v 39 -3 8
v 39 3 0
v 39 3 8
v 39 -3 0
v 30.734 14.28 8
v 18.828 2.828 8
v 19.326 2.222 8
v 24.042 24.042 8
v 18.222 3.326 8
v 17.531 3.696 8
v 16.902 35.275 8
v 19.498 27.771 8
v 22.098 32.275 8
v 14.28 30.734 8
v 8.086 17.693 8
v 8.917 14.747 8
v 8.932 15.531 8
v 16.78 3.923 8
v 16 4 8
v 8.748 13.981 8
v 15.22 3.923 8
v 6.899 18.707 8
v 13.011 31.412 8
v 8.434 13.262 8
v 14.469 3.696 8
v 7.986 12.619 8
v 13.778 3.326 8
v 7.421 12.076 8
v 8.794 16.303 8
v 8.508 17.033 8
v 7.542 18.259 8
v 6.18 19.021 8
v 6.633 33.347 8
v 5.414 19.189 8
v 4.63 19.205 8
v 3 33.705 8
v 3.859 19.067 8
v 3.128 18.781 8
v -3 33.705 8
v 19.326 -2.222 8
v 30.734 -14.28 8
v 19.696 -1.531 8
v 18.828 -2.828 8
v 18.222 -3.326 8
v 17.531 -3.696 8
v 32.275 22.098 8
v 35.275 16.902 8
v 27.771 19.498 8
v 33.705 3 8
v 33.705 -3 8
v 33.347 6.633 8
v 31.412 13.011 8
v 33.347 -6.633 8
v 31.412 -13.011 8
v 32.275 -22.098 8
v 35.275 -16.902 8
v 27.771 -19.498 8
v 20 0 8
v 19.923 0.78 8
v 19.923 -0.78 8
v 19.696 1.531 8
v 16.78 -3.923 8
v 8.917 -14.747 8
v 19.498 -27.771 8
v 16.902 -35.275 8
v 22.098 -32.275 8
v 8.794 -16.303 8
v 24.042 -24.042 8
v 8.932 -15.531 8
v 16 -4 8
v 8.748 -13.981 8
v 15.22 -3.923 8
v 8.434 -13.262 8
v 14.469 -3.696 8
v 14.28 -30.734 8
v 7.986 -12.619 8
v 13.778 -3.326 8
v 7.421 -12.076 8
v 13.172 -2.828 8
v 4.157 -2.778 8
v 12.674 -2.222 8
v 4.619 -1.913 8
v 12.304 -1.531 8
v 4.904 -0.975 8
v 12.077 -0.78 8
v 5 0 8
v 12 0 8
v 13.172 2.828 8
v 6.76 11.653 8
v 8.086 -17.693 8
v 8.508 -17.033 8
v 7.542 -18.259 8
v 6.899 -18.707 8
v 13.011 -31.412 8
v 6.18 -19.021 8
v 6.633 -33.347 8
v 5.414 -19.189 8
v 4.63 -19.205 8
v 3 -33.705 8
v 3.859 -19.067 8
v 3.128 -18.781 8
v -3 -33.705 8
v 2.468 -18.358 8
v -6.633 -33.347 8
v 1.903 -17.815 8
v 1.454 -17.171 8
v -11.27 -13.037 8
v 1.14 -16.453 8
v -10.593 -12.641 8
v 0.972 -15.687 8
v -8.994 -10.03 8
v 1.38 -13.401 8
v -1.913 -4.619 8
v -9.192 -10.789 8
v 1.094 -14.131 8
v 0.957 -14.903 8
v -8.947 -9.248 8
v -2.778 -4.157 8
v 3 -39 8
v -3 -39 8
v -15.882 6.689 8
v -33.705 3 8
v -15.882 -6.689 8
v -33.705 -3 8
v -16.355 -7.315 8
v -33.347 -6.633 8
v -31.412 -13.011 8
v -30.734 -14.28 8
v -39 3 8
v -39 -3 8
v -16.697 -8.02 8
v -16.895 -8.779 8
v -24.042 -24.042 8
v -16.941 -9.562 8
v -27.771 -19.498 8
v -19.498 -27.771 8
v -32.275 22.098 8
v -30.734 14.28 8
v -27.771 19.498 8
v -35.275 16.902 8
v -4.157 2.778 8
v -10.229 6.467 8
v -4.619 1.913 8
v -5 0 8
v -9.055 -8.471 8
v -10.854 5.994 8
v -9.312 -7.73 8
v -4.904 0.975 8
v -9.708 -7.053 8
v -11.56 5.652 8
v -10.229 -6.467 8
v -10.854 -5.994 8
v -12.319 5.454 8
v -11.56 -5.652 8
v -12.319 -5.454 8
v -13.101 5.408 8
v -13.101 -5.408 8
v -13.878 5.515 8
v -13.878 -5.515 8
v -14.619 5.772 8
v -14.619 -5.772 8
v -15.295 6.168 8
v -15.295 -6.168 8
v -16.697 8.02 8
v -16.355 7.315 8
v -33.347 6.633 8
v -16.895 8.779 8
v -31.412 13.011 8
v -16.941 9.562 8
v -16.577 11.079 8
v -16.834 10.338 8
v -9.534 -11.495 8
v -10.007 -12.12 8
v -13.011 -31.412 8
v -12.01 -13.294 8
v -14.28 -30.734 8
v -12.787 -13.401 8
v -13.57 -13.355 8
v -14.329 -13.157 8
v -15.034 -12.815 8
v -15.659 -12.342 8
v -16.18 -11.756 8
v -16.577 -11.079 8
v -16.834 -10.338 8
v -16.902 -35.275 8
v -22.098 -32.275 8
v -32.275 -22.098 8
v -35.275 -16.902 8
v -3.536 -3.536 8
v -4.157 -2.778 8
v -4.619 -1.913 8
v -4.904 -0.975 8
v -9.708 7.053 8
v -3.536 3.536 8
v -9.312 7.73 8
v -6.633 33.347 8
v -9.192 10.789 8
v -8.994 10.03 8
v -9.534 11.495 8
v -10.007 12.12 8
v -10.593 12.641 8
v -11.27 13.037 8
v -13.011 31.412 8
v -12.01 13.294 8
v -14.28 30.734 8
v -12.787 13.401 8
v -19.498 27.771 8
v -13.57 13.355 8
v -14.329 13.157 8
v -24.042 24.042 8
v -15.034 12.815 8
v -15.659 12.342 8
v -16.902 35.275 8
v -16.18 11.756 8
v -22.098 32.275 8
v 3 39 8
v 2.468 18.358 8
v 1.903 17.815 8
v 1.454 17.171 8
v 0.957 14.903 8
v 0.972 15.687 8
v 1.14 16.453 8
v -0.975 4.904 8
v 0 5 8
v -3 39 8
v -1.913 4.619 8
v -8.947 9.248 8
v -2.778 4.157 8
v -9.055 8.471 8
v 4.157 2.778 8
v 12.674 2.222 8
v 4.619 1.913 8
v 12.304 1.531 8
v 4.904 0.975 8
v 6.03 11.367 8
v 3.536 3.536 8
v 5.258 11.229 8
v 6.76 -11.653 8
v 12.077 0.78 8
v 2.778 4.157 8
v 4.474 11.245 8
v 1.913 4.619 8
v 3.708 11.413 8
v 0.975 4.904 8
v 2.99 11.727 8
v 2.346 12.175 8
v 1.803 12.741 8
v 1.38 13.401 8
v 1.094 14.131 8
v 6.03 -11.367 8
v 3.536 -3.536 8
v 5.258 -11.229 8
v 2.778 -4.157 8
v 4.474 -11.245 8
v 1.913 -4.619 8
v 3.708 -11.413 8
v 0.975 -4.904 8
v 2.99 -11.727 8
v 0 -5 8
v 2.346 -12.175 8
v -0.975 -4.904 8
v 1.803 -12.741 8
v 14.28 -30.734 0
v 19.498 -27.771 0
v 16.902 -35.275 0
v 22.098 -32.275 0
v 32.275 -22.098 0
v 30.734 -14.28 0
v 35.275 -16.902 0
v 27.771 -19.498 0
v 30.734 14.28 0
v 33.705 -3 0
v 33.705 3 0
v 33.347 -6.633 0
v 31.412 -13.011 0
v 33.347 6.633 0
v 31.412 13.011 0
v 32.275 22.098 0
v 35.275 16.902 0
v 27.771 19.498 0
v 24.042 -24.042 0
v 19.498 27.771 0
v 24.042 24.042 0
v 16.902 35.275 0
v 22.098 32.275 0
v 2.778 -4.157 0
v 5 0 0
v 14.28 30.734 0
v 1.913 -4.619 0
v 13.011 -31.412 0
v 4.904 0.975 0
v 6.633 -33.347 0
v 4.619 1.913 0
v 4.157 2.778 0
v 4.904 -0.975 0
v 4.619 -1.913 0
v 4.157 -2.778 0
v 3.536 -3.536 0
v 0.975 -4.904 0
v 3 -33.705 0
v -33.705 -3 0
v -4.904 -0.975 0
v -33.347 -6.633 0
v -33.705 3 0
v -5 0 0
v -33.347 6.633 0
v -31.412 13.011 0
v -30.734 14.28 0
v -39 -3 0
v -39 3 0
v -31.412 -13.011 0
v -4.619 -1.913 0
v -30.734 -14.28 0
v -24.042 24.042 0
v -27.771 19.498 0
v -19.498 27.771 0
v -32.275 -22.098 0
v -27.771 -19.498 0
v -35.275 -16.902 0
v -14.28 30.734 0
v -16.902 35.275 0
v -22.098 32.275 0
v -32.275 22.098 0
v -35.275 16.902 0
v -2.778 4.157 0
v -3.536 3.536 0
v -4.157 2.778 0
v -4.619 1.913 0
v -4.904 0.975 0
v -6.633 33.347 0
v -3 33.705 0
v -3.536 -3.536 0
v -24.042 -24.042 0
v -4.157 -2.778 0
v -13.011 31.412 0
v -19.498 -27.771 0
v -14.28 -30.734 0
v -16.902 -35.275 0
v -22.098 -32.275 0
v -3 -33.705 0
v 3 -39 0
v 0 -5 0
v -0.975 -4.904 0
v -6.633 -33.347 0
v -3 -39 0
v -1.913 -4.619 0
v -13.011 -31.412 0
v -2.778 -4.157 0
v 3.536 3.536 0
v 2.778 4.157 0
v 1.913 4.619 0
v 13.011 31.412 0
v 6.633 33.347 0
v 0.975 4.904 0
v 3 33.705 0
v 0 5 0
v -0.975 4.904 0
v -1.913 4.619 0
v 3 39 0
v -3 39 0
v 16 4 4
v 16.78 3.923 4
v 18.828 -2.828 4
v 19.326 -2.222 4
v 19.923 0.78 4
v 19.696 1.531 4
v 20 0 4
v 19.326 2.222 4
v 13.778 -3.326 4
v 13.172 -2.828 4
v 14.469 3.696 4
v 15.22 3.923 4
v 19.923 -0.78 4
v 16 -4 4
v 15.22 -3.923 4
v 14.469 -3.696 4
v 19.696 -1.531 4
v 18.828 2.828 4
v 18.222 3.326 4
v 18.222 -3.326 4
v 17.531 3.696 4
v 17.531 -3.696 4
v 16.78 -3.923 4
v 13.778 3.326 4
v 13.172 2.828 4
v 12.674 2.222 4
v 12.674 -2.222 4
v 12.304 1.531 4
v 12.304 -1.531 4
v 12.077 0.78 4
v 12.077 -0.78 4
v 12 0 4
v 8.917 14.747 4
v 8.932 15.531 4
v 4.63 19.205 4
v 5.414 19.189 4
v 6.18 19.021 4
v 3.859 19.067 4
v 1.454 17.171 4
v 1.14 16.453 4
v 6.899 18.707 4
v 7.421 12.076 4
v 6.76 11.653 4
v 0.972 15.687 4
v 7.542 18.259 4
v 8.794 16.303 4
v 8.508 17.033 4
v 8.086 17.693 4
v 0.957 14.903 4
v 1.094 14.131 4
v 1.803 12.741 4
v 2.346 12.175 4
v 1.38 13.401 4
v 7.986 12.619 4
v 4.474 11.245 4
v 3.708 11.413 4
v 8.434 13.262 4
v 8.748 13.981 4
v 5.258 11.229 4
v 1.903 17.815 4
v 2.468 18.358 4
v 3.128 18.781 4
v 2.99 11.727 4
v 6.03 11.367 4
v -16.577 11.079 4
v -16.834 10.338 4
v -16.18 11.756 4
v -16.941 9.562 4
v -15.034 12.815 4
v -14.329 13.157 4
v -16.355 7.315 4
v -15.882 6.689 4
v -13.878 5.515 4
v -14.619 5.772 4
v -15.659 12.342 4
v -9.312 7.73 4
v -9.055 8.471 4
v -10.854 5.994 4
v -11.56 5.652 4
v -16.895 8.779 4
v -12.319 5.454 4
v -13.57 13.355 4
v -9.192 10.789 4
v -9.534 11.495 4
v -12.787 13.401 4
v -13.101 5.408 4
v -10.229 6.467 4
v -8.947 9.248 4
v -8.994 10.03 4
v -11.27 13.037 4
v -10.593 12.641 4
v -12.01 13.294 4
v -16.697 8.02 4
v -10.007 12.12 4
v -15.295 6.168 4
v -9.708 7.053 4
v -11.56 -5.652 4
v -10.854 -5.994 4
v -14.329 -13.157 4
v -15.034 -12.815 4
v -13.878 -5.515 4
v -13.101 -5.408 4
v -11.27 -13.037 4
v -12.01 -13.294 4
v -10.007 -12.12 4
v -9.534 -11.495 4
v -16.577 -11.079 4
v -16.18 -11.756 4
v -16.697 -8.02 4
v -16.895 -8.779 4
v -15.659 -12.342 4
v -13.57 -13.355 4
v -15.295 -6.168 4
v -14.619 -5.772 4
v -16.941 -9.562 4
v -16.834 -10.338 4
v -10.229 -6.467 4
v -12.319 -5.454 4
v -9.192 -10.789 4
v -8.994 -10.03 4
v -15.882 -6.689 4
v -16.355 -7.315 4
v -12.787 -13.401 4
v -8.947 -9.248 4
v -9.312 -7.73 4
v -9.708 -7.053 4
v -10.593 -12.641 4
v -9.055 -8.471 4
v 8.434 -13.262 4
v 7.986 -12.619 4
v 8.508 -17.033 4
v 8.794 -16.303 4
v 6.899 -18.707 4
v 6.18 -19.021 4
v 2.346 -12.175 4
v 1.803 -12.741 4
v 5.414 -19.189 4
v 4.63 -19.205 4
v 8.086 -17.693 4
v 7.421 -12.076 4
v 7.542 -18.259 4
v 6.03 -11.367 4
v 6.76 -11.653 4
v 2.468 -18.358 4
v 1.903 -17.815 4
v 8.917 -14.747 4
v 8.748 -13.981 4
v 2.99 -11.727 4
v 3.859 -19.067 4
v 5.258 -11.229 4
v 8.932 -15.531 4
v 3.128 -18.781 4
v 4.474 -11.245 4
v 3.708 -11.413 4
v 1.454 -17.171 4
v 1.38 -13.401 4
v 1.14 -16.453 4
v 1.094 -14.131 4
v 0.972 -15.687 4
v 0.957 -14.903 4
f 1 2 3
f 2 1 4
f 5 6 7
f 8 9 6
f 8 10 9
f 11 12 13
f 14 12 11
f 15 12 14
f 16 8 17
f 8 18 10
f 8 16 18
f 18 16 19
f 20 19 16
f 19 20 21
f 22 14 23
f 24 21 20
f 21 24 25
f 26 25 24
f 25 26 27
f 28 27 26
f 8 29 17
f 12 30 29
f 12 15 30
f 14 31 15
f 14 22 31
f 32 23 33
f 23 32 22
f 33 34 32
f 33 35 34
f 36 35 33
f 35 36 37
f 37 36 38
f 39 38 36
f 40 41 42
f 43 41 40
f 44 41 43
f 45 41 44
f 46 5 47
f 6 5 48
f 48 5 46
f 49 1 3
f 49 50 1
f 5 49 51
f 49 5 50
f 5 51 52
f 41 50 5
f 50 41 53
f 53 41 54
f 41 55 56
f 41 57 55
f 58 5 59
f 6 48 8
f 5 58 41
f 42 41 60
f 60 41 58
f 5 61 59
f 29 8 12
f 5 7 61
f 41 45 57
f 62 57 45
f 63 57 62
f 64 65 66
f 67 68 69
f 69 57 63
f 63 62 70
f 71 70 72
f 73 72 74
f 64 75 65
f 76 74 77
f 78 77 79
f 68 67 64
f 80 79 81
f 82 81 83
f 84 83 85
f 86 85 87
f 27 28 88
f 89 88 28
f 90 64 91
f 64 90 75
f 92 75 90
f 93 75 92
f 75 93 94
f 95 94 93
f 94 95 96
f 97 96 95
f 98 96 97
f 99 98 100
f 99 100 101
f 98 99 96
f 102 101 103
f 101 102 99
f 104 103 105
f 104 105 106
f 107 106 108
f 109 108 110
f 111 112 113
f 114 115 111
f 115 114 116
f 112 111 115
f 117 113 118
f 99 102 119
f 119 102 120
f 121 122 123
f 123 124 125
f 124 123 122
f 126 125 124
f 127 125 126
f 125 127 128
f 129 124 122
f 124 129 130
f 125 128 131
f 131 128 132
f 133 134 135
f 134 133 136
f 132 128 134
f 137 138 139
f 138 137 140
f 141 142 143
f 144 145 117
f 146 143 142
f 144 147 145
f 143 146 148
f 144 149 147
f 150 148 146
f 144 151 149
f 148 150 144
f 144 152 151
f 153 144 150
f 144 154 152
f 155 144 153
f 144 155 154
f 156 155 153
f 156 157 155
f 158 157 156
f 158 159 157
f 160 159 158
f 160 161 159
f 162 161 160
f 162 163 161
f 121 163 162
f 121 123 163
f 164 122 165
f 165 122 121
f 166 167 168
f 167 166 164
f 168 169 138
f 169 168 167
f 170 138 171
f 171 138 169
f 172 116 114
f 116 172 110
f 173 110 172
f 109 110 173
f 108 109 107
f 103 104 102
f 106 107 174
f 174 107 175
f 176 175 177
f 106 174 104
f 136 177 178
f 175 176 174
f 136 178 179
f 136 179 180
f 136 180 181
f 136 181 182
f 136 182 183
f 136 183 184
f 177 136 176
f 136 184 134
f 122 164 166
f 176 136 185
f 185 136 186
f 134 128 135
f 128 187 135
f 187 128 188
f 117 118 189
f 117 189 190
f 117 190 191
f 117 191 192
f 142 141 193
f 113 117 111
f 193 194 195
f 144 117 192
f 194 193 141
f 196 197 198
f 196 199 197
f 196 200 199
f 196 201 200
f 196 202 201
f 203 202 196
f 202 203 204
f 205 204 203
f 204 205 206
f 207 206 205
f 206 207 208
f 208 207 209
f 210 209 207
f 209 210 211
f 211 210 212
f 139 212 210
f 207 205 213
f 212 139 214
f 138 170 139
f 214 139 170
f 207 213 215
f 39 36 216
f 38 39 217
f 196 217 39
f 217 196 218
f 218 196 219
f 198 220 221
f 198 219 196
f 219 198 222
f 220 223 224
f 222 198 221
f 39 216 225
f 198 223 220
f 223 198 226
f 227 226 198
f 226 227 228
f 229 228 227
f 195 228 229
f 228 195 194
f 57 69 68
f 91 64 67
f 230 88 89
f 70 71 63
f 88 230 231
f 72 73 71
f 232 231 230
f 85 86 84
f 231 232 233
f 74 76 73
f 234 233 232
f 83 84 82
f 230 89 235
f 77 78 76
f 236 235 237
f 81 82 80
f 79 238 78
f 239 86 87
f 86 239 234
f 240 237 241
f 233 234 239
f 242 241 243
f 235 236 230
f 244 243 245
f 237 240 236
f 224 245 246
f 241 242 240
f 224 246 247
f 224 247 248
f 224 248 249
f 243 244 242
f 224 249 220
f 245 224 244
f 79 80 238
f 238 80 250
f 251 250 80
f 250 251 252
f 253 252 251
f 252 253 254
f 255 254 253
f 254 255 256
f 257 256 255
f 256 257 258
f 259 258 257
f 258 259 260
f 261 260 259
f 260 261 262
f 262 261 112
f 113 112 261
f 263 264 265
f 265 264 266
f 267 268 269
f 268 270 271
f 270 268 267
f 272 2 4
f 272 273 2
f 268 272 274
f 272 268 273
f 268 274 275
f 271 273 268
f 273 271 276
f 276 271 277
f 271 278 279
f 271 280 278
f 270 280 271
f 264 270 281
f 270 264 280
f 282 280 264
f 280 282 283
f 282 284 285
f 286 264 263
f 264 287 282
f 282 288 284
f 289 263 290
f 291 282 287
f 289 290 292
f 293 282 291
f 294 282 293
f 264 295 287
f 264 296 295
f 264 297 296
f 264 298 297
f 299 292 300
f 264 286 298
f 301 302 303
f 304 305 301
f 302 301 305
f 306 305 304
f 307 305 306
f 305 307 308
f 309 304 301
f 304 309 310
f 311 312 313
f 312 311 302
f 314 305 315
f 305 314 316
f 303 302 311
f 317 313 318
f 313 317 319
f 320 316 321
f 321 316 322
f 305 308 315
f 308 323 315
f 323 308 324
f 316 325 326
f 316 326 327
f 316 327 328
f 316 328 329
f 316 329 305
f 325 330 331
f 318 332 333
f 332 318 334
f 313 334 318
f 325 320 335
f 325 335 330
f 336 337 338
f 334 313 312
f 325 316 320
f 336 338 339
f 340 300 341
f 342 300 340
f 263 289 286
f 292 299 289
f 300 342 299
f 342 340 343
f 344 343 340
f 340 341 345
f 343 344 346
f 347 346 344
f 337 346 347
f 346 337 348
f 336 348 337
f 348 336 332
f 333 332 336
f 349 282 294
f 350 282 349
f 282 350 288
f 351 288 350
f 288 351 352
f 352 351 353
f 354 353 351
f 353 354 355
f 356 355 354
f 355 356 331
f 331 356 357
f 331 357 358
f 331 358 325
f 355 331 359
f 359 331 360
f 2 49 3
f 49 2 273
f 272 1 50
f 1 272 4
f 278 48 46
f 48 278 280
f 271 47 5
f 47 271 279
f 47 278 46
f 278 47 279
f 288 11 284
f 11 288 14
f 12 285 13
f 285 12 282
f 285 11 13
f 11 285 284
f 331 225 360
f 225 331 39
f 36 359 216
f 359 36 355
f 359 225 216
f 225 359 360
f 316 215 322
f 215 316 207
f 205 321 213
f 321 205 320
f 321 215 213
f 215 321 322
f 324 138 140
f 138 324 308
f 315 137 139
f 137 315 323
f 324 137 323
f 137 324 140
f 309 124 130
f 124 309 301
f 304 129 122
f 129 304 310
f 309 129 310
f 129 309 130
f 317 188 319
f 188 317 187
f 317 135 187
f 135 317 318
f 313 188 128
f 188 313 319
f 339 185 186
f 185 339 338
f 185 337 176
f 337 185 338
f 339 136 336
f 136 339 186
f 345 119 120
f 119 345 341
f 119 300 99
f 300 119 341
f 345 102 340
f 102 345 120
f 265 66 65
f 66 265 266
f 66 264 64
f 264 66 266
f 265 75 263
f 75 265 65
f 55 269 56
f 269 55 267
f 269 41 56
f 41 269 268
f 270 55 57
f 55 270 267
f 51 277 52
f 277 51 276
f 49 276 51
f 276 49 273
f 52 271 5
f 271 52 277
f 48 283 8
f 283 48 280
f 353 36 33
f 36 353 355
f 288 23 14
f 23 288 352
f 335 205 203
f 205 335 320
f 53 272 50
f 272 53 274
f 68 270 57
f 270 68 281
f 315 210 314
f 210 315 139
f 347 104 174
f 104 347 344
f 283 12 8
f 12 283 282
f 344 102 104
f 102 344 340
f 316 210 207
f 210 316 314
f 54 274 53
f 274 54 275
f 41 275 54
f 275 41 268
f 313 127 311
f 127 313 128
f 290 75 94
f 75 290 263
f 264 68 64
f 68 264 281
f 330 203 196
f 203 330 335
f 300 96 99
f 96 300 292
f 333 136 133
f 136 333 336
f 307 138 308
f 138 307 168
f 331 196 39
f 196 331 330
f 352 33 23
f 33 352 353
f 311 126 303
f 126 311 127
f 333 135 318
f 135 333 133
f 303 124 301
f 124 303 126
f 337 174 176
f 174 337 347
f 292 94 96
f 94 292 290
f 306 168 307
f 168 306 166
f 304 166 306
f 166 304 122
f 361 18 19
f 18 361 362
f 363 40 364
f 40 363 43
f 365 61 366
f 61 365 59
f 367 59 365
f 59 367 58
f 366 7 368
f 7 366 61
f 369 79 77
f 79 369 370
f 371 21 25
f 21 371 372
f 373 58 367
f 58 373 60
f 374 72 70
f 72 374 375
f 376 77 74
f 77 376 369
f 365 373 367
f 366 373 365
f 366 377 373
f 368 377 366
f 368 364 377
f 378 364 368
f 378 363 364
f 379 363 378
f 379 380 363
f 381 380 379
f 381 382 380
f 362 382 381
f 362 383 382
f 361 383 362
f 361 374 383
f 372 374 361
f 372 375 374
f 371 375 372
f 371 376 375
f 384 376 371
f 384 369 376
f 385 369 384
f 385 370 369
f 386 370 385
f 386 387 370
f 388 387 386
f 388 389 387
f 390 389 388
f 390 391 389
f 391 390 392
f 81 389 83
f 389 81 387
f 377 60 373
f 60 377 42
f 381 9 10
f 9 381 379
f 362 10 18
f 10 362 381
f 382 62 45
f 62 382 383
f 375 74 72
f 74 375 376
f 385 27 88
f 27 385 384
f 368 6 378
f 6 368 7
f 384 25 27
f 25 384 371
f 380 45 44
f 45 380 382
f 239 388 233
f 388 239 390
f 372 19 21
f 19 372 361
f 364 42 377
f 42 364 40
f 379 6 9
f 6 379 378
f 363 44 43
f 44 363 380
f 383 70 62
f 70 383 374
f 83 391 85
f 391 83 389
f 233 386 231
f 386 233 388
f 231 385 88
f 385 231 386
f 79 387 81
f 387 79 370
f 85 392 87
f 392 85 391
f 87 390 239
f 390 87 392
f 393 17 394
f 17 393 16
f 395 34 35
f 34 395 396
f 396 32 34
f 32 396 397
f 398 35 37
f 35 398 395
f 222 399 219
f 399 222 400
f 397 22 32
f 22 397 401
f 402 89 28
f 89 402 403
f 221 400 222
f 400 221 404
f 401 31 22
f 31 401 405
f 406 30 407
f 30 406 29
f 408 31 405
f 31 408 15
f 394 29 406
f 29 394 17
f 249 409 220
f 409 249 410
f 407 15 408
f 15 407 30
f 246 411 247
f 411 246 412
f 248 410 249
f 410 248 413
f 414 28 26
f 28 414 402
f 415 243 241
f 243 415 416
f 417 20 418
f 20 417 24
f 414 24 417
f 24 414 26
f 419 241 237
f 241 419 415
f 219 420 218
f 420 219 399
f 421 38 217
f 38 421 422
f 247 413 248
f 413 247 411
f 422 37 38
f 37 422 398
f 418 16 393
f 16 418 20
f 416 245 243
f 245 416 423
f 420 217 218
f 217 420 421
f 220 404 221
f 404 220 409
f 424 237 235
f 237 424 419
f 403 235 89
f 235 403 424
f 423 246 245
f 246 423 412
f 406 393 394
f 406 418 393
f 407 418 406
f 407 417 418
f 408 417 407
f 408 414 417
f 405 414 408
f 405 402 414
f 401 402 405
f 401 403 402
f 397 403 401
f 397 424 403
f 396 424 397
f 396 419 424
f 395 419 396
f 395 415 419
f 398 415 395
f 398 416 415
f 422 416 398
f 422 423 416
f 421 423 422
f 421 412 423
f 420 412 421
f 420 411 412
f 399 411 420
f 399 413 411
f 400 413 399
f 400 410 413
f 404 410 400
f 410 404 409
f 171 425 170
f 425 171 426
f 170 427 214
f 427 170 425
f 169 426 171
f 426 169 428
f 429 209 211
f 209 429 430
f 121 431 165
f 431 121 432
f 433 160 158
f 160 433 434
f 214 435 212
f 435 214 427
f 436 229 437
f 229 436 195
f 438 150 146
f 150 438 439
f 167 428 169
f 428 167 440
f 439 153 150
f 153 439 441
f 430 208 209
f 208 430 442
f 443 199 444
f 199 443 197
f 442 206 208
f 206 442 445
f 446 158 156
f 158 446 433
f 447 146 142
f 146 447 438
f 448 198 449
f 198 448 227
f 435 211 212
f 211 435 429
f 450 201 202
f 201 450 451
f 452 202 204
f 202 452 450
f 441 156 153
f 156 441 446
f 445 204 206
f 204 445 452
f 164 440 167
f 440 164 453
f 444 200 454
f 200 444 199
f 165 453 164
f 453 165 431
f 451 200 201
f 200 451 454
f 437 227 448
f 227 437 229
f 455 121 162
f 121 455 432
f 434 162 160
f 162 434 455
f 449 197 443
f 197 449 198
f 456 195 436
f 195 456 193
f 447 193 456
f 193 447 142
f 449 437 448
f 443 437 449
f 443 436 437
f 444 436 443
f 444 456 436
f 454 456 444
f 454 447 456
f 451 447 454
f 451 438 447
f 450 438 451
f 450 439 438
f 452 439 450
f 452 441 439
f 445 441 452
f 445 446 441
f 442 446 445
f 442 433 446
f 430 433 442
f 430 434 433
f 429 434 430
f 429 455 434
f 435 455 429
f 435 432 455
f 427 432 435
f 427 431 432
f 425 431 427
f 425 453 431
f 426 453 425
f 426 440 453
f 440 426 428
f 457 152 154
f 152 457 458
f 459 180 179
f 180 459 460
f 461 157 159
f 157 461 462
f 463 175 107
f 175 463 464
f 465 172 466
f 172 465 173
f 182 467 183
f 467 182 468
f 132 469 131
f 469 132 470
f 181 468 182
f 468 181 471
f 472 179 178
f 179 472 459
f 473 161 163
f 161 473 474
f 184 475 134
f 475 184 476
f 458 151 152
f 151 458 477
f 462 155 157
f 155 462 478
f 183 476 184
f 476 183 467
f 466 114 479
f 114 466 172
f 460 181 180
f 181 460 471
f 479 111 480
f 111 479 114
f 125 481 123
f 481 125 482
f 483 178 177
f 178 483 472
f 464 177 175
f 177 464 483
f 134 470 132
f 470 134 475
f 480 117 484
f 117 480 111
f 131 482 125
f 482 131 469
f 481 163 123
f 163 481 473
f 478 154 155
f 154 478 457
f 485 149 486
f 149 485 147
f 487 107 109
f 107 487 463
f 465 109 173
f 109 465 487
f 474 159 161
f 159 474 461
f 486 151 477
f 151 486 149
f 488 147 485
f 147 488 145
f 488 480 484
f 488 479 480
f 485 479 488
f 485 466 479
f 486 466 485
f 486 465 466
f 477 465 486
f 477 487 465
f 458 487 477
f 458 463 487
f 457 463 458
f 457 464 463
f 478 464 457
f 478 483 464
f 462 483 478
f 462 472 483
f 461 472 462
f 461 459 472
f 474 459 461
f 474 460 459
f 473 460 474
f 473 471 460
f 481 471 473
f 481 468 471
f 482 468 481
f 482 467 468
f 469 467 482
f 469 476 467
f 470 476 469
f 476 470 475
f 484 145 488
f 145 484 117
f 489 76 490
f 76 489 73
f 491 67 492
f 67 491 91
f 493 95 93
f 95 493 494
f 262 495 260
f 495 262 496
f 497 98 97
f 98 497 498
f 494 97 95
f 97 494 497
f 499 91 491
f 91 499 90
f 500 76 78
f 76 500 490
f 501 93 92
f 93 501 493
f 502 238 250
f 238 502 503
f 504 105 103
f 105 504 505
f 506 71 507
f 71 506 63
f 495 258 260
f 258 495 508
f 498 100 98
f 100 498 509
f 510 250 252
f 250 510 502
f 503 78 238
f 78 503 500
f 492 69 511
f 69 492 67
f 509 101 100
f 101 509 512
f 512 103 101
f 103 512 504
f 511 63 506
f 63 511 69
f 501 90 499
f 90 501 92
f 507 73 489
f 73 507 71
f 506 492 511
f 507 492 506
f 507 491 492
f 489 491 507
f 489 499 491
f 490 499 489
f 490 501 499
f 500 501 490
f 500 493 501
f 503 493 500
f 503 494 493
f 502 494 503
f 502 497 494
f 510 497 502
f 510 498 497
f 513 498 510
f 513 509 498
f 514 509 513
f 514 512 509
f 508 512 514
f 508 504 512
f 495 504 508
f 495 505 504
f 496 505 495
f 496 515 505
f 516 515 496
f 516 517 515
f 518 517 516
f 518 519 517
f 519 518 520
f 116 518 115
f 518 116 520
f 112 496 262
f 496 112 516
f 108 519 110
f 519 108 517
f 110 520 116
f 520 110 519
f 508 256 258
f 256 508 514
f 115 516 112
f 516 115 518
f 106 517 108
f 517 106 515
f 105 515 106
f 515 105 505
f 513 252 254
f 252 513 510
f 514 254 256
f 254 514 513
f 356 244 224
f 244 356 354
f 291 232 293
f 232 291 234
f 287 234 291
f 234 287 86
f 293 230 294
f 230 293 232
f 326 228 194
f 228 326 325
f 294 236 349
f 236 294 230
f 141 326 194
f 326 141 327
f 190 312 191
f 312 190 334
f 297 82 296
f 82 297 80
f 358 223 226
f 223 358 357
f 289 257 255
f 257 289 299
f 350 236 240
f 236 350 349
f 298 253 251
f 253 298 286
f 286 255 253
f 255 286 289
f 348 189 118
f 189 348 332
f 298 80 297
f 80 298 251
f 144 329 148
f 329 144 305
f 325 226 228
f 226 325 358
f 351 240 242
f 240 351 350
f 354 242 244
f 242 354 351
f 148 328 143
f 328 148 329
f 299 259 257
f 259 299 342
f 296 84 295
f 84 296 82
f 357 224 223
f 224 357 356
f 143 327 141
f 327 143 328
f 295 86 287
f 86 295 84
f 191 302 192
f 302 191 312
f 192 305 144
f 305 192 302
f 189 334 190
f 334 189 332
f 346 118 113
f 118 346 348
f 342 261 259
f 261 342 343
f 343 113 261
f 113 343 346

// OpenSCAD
$fn = 32;

// ----------------------------------------------------------------------
// Spur blank: lightened gear blank
// ----------------------------------------------------------------------

// --- parameters (mm) ---
disc_r = 34;              // blank root radius
disc_t = 8;               // blank thickness
n_teeth = 12;             // stub tooth count
tooth_w = 6;              // tooth width at the root
tooth_h = 5;              // tooth height above the root
bore_r = 5;               // central bore radius
ring_r = 16;              // lightening pocket ring radius
pocket_r = 4;             // lightening pocket radius
fit_tol = 0.05;           // tolerance for press fits, mm
free_tol = 0.2;           // tolerance for clearance fits, mm

out_r = disc_r + tooth_h;  // tip radius
bbox_x = 78.0;  // measured width over the teeth
bbox_y = 78.0;  // measured depth over the teeth

difference() {
union() {
  cylinder(r = disc_r, h = disc_t);
  for (i = [0 : n_teeth - 1])
    rotate([0, 0, i * 360 / n_teeth])
      translate([disc_r - 1, -tooth_w / 2, 0])
        cube([tooth_h + 1, tooth_w, disc_t]);
}
  translate([0, 0, -1]) cylinder(r = bore_r, h = disc_t + 2);
  for (i = [0 : 5])
    rotate([0, 0, i * 72])
      translate([ring_r, 0, disc_t - 4])
        cylinder(r = pocket_r, h = 5);
}
